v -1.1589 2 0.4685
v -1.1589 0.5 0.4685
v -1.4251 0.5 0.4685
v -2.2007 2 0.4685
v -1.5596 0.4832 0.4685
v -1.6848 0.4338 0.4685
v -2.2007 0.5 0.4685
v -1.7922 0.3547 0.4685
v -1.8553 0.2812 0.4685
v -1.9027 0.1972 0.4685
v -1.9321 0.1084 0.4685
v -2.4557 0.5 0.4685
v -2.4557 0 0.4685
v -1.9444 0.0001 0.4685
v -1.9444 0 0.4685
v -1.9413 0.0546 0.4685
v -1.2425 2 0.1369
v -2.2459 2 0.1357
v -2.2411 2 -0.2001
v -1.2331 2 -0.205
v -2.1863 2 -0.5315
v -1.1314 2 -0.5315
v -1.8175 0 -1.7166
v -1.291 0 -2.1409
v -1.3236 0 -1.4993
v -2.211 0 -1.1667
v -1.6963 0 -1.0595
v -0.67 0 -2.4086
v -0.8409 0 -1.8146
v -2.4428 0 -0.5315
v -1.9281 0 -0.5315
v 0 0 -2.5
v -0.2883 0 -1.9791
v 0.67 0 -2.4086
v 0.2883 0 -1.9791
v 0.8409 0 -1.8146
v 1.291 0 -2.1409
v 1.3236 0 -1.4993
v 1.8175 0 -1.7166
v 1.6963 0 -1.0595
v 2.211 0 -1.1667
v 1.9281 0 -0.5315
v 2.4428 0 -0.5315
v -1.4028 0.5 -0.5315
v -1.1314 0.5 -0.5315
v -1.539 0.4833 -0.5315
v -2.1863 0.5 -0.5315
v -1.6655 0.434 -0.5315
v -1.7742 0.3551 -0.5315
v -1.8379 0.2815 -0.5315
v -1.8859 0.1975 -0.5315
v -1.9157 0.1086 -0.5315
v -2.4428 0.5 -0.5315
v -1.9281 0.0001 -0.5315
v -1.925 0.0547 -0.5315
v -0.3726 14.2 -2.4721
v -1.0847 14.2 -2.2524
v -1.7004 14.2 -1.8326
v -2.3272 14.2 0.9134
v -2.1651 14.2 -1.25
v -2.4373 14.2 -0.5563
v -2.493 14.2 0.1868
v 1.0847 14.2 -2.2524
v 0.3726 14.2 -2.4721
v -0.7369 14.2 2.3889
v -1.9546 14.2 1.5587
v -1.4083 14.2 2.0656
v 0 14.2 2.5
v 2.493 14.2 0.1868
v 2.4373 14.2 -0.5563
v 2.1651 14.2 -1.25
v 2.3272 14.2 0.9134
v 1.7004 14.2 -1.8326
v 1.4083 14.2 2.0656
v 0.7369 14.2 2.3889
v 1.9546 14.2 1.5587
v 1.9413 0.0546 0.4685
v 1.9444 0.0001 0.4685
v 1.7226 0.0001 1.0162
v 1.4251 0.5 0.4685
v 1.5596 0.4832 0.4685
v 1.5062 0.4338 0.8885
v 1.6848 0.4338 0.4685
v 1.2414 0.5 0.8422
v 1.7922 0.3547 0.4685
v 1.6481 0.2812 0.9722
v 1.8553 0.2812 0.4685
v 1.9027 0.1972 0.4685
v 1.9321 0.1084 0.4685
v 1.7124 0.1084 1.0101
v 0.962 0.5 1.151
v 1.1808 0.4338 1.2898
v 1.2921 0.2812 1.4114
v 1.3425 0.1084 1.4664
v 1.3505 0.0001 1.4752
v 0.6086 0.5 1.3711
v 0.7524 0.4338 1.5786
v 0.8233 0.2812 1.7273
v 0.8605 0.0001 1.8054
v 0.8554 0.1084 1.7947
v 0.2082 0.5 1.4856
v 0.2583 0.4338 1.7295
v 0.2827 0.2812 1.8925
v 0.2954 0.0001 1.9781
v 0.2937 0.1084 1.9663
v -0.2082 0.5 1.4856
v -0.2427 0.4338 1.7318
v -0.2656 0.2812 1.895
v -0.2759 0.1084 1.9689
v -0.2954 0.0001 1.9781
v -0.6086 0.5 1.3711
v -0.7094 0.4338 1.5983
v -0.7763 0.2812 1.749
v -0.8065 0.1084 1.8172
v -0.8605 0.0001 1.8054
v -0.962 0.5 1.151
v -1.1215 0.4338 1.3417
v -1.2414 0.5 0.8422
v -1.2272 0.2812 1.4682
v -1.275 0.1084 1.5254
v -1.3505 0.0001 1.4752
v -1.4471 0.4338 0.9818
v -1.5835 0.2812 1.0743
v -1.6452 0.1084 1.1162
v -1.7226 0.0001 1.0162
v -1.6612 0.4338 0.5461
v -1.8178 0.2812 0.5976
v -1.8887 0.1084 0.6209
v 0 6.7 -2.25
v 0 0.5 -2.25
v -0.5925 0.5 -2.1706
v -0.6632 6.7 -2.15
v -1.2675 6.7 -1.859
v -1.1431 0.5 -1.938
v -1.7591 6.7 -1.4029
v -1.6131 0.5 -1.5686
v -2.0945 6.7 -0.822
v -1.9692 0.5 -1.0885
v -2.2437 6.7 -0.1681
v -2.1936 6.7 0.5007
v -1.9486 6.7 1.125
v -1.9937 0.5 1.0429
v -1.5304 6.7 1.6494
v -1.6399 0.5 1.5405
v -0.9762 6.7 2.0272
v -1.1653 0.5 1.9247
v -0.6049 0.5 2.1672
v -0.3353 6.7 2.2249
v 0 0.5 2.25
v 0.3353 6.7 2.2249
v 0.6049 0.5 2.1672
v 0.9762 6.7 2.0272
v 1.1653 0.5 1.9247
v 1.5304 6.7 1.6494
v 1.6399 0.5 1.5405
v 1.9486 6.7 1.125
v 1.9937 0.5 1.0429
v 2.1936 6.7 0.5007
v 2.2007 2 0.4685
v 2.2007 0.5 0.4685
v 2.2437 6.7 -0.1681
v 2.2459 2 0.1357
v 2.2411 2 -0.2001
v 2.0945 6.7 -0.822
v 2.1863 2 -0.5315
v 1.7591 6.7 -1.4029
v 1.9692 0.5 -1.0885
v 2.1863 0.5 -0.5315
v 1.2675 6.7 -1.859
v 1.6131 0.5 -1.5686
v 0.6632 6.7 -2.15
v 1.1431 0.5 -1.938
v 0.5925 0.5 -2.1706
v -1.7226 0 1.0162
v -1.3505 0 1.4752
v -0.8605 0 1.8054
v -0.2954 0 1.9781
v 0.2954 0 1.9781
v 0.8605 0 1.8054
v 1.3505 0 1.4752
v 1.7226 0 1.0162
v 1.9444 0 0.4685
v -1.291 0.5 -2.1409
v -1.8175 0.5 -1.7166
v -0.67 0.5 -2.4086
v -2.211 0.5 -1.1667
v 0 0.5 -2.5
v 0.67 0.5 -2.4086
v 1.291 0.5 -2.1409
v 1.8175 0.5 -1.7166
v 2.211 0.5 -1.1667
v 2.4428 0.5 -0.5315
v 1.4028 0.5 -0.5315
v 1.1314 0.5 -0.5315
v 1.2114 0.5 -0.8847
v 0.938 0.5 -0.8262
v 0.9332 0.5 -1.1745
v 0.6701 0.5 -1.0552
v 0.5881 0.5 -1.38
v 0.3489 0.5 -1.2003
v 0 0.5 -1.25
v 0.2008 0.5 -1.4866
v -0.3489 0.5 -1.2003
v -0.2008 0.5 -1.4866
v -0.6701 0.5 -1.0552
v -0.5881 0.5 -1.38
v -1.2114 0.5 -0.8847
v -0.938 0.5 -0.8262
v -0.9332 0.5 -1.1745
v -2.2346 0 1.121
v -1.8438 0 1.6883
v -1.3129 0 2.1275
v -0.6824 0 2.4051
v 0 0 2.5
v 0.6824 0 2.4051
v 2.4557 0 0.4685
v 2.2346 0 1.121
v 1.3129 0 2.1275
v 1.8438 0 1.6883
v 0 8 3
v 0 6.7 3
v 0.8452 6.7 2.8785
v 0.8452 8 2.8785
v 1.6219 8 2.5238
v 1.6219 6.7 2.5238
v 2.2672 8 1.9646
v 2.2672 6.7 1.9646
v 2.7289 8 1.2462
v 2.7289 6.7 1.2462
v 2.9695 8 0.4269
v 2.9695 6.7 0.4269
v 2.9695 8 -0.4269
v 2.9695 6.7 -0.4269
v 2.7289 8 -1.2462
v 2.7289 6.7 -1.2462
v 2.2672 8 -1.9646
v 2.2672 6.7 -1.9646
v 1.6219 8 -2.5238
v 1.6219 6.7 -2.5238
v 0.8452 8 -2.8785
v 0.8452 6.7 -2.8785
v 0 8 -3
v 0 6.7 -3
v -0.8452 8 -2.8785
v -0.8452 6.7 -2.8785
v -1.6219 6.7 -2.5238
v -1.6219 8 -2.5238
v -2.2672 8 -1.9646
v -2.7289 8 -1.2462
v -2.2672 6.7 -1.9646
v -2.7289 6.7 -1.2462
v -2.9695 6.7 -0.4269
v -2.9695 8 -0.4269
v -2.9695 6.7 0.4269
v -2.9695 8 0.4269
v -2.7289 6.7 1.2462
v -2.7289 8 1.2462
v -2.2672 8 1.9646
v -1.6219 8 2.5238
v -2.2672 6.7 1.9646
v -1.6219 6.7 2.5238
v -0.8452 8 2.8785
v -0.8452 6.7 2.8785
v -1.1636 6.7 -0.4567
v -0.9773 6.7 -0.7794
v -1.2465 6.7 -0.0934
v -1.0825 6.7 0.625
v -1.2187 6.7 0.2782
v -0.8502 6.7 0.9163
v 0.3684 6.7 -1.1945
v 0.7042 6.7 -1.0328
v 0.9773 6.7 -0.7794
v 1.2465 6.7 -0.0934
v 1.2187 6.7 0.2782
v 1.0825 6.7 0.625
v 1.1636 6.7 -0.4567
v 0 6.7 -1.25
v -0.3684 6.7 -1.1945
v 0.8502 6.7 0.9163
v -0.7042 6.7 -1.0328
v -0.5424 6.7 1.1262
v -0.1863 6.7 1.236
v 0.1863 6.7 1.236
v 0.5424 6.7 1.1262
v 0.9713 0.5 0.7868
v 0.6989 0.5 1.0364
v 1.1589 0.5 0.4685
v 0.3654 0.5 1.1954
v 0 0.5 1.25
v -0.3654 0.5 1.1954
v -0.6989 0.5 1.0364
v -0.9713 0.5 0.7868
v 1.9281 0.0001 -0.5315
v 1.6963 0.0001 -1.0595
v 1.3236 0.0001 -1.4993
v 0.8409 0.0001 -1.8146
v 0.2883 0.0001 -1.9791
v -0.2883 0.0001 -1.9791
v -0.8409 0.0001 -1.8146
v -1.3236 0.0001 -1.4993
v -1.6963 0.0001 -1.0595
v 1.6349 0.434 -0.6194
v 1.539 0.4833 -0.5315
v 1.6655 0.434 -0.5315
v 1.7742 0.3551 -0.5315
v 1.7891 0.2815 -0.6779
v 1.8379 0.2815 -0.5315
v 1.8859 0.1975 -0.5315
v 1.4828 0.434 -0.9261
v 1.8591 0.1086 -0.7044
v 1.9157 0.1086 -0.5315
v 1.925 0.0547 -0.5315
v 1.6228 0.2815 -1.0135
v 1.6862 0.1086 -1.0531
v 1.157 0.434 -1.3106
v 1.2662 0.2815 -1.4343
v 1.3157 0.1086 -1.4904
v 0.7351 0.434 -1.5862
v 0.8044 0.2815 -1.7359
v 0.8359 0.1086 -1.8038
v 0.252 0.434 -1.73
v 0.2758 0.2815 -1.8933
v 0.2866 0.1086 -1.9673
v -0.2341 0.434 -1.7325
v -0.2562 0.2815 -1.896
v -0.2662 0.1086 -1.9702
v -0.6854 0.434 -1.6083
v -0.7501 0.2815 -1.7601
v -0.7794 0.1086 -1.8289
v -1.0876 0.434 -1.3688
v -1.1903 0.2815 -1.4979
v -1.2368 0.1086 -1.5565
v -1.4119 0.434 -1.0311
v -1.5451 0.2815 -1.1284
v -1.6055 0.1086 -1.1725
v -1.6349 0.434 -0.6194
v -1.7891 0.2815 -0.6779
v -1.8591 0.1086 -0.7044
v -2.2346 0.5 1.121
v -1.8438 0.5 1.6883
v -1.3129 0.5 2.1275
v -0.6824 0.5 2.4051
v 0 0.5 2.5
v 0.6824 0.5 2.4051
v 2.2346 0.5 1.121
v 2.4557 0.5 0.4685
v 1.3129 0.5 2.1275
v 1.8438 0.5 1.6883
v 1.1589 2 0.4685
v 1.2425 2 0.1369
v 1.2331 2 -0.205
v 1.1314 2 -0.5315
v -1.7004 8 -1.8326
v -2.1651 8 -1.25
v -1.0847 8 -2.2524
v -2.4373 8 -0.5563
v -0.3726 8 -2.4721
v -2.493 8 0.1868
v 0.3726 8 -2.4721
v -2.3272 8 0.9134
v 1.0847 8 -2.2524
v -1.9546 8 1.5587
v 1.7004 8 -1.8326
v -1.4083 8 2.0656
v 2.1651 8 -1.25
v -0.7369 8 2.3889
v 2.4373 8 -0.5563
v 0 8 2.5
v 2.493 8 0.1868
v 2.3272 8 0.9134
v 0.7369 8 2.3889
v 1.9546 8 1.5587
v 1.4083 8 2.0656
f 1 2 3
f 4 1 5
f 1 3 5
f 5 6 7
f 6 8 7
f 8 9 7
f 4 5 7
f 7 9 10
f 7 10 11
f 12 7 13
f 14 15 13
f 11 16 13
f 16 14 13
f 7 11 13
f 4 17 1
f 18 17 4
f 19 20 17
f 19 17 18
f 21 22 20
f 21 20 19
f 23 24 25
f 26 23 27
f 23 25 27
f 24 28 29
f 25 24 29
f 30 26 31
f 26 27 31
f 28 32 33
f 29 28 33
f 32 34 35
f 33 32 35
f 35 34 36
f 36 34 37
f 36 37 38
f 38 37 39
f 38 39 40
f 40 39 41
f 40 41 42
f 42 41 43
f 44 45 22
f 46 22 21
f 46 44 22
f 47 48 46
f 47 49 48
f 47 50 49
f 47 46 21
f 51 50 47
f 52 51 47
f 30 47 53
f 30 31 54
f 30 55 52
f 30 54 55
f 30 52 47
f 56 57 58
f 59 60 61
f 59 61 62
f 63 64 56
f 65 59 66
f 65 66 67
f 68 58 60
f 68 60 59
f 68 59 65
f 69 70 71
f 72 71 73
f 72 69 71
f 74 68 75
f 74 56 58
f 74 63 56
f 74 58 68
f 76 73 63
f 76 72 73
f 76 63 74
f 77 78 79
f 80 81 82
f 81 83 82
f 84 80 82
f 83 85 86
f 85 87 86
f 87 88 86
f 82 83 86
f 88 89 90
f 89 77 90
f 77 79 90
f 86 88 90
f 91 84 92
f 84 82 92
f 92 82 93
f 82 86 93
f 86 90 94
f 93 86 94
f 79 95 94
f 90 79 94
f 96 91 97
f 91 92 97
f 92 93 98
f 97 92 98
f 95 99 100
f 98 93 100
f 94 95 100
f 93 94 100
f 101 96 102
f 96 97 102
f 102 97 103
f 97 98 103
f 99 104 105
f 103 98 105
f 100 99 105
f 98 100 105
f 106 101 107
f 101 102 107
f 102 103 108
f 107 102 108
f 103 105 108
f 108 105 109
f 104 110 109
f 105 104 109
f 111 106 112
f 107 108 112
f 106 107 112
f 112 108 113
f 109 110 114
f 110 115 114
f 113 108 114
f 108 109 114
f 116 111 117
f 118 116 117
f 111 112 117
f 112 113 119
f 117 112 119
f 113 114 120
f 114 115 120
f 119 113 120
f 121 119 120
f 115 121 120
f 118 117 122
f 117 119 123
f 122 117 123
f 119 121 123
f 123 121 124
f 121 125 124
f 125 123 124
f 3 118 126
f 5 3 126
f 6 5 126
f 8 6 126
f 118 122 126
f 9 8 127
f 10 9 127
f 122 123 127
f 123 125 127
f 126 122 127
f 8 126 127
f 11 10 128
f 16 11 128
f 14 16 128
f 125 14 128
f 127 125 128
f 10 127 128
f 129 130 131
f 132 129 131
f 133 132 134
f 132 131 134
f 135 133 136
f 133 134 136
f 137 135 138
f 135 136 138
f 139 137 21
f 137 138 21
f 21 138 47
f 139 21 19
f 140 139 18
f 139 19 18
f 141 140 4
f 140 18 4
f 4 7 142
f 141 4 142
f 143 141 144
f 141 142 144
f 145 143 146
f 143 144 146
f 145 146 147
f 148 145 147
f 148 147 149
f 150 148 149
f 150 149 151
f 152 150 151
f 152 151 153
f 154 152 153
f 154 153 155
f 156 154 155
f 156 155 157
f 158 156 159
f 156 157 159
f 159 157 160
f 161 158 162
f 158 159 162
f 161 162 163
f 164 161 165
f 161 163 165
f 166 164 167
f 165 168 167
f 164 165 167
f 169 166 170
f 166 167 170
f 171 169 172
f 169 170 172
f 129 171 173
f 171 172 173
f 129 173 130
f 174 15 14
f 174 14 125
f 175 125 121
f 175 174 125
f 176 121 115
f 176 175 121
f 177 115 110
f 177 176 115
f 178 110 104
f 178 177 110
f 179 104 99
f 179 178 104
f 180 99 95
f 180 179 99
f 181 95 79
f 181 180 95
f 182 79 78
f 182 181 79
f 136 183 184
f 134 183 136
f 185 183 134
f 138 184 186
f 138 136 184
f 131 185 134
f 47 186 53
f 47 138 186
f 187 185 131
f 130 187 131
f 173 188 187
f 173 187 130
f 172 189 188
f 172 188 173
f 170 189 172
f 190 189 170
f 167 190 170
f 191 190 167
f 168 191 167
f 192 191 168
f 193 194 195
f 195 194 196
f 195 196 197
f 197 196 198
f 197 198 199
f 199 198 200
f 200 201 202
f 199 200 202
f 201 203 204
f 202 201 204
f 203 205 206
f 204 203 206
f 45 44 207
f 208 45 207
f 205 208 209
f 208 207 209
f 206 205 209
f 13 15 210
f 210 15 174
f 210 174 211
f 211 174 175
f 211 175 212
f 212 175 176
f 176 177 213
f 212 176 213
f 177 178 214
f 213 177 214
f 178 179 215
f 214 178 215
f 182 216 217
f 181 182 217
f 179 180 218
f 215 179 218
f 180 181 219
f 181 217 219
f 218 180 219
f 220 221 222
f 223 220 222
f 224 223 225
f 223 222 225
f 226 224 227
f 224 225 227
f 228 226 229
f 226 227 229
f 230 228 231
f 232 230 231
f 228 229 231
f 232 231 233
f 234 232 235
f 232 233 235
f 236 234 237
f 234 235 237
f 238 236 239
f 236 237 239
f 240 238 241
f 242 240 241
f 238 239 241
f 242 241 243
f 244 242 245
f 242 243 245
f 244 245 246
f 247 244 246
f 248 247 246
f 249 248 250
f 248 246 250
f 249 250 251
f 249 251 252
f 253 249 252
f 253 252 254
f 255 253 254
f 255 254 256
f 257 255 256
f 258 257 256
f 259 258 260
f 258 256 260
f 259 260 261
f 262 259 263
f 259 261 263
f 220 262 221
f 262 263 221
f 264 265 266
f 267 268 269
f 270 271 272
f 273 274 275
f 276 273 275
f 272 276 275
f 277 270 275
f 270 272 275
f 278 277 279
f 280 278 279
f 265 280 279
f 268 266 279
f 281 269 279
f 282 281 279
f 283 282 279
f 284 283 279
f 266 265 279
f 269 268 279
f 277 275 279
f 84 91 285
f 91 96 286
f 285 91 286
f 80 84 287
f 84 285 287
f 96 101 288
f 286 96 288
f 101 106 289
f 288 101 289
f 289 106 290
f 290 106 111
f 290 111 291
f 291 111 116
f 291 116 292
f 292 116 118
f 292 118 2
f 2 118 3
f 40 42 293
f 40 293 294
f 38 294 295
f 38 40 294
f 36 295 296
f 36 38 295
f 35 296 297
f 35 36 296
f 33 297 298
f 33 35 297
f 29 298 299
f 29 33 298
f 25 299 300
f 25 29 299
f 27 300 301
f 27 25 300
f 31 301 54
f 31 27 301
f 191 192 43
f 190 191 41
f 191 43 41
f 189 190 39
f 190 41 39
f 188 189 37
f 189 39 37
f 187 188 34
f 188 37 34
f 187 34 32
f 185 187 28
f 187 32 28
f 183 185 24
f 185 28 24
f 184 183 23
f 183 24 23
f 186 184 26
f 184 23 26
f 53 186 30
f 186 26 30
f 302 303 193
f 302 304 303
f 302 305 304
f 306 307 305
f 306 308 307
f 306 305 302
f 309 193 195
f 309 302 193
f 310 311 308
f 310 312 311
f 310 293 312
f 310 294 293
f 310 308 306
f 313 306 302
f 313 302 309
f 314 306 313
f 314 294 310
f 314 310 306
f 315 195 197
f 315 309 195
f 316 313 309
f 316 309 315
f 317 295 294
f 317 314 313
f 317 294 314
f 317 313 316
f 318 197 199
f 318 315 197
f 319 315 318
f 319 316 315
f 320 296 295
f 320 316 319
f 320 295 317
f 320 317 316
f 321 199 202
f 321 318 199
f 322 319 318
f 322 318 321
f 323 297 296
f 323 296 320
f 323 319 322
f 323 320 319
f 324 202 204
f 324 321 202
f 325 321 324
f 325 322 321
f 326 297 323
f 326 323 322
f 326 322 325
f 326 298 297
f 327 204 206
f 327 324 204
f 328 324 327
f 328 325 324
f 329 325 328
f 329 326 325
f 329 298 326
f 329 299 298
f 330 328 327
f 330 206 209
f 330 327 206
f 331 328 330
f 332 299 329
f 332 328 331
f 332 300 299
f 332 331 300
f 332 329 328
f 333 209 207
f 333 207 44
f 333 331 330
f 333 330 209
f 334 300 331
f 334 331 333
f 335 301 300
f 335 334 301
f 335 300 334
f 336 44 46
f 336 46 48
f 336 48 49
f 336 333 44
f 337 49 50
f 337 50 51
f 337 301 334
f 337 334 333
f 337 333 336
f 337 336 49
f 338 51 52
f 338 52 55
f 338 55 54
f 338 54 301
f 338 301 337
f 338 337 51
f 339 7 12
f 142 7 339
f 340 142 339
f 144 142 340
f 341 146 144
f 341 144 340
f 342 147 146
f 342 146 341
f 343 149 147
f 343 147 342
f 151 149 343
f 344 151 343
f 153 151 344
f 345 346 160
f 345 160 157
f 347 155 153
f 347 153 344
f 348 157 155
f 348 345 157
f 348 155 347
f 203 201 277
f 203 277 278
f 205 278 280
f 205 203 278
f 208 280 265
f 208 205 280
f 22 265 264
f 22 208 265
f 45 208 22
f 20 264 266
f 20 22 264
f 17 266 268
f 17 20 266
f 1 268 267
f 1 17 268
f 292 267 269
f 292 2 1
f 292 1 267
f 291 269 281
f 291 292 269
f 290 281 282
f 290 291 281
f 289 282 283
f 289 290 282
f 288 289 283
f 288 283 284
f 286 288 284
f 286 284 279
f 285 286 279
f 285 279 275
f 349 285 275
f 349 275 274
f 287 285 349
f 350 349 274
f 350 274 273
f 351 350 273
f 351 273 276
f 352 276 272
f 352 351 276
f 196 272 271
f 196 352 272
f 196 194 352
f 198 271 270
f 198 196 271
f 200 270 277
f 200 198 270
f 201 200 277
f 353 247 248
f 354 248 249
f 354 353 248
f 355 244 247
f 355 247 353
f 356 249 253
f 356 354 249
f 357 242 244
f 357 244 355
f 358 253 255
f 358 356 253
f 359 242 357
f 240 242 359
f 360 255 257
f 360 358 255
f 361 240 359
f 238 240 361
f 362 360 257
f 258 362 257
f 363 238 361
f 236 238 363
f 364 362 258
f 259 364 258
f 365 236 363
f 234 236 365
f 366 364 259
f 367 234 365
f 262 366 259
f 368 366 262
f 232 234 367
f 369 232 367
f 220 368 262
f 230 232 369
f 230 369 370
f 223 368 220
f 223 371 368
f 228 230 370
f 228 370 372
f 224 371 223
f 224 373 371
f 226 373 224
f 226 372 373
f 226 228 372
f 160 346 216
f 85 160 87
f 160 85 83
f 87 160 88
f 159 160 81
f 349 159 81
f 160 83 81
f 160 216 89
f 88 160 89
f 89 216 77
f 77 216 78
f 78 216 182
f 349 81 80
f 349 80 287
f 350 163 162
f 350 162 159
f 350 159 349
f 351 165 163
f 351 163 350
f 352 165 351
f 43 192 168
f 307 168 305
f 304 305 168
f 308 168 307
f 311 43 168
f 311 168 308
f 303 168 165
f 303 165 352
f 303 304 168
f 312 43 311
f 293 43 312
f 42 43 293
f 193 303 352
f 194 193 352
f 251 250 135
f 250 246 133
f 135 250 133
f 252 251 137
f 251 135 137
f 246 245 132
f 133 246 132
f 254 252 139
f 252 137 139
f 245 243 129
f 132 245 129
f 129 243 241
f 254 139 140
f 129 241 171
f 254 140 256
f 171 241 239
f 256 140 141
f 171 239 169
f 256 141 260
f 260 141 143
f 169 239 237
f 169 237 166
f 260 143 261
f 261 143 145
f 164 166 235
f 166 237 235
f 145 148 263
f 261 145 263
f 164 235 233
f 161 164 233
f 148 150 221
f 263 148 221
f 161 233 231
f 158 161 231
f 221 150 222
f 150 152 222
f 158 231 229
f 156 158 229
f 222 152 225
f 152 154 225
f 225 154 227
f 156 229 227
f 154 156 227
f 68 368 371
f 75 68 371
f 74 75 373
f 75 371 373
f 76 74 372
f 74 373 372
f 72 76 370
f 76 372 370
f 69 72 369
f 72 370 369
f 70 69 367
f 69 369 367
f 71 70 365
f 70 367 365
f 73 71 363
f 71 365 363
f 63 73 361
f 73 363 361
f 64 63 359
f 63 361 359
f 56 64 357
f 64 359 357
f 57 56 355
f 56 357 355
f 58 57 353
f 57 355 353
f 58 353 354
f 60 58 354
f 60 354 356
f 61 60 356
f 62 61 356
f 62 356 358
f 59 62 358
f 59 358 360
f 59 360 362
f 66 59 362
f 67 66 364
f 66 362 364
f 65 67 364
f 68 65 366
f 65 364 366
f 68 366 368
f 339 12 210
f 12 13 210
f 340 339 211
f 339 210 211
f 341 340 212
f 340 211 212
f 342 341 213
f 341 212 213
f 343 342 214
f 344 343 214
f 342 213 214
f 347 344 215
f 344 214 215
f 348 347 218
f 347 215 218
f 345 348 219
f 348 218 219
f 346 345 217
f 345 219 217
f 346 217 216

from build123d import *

# Parameters (mm, degrees)
SKETCH1_R           = 2.5
SKETCH1_R_2         = 2
BOSS_EXTRUDE1_DEPTH = 0.5
SKETCH3_R           = 2.25
SKETCH3_R_2         = 1.25
BOSS_EXTRUDE2_DEPTH = 6.2
SKETCH5_R           = 3
BOSS_EXTRUDE3_DEPTH = 1.3
SKETCH6_R           = 2.5
BOSS_EXTRUDE4_DEPTH = 6.2
SKETCH24_W          = 5.284246403
SKETCH24_H          = 1
CUT_EXTRUDE1_DEPTH  = 2
FILLET1_R           = 0.5


with BuildPart() as part:
    # Sketch1 → Boss-Extrude1 (new body)
    with BuildSketch(Plane(origin=(0, 0, 0), x_dir=(1, 0, 0), z_dir=(0, 1, 0))):
        with Locations(Location((0, 0, 0), (0, 0, 270))):
            Circle(SKETCH1_R)
        with Locations(Location((0, 0, 0), (0, 0, 270))):
            Circle(SKETCH1_R_2, mode=Mode.SUBTRACT)
    extrude(amount=BOSS_EXTRUDE1_DEPTH)

    # Sketch3 → Boss-Extrude2 (add)
    with BuildSketch(Plane(origin=(0, 0.5, 0), x_dir=(1, 0, 0), z_dir=(0, 1, 0))):
        with Locations(Location((0, 0, 0), (0, 0, 90))):
            Circle(SKETCH3_R)
        with Locations(Location((0, 0, 0), (0, 0, 90))):
            Circle(SKETCH3_R_2, mode=Mode.SUBTRACT)
    extrude(amount=BOSS_EXTRUDE2_DEPTH)

    # Sketch5 → Boss-Extrude3 (add)
    with BuildSketch(Plane(origin=(0, 6.7, 0), x_dir=(1, 0, 0), z_dir=(0, 1, 0))):
        with Locations(Location((0, 0, 0), (0, 0, 270))):
            Circle(SKETCH5_R)
    extrude(amount=BOSS_EXTRUDE3_DEPTH)

    # Sketch6 → Boss-Extrude4 (add)
    with BuildSketch(Plane(origin=(0, 8, 0), x_dir=(1, 0, 0), z_dir=(0, 1, 0))):
        with Locations(Location((0, 0, 0), (0, 0, 270))):
            Circle(SKETCH6_R)
    extrude(amount=BOSS_EXTRUDE4_DEPTH)

    # Sketch24 → Cut-Extrude1 (cut)
    with BuildSketch(Plane(origin=(0, 0, 0), x_dir=(-1, 0, 0), z_dir=(0, -1, 0))):
        with Locations((-0.034581621, 0.031508974)):
            Rectangle(SKETCH24_W, SKETCH24_H)
    extrude(amount=-CUT_EXTRUDE1_DEPTH, mode=Mode.SUBTRACT)

    # Fillet1
    fillet1_edges = [part.edges().sort_by_distance(p)[0] for p in [
        (0, 0.5, 2),
        (0, 0.5, -2),
    ]]
    fillet(fillet1_edges, radius=FILLET1_R - 0.0001)  # a hair under: the kernel refuses the full size


solid = part.part
